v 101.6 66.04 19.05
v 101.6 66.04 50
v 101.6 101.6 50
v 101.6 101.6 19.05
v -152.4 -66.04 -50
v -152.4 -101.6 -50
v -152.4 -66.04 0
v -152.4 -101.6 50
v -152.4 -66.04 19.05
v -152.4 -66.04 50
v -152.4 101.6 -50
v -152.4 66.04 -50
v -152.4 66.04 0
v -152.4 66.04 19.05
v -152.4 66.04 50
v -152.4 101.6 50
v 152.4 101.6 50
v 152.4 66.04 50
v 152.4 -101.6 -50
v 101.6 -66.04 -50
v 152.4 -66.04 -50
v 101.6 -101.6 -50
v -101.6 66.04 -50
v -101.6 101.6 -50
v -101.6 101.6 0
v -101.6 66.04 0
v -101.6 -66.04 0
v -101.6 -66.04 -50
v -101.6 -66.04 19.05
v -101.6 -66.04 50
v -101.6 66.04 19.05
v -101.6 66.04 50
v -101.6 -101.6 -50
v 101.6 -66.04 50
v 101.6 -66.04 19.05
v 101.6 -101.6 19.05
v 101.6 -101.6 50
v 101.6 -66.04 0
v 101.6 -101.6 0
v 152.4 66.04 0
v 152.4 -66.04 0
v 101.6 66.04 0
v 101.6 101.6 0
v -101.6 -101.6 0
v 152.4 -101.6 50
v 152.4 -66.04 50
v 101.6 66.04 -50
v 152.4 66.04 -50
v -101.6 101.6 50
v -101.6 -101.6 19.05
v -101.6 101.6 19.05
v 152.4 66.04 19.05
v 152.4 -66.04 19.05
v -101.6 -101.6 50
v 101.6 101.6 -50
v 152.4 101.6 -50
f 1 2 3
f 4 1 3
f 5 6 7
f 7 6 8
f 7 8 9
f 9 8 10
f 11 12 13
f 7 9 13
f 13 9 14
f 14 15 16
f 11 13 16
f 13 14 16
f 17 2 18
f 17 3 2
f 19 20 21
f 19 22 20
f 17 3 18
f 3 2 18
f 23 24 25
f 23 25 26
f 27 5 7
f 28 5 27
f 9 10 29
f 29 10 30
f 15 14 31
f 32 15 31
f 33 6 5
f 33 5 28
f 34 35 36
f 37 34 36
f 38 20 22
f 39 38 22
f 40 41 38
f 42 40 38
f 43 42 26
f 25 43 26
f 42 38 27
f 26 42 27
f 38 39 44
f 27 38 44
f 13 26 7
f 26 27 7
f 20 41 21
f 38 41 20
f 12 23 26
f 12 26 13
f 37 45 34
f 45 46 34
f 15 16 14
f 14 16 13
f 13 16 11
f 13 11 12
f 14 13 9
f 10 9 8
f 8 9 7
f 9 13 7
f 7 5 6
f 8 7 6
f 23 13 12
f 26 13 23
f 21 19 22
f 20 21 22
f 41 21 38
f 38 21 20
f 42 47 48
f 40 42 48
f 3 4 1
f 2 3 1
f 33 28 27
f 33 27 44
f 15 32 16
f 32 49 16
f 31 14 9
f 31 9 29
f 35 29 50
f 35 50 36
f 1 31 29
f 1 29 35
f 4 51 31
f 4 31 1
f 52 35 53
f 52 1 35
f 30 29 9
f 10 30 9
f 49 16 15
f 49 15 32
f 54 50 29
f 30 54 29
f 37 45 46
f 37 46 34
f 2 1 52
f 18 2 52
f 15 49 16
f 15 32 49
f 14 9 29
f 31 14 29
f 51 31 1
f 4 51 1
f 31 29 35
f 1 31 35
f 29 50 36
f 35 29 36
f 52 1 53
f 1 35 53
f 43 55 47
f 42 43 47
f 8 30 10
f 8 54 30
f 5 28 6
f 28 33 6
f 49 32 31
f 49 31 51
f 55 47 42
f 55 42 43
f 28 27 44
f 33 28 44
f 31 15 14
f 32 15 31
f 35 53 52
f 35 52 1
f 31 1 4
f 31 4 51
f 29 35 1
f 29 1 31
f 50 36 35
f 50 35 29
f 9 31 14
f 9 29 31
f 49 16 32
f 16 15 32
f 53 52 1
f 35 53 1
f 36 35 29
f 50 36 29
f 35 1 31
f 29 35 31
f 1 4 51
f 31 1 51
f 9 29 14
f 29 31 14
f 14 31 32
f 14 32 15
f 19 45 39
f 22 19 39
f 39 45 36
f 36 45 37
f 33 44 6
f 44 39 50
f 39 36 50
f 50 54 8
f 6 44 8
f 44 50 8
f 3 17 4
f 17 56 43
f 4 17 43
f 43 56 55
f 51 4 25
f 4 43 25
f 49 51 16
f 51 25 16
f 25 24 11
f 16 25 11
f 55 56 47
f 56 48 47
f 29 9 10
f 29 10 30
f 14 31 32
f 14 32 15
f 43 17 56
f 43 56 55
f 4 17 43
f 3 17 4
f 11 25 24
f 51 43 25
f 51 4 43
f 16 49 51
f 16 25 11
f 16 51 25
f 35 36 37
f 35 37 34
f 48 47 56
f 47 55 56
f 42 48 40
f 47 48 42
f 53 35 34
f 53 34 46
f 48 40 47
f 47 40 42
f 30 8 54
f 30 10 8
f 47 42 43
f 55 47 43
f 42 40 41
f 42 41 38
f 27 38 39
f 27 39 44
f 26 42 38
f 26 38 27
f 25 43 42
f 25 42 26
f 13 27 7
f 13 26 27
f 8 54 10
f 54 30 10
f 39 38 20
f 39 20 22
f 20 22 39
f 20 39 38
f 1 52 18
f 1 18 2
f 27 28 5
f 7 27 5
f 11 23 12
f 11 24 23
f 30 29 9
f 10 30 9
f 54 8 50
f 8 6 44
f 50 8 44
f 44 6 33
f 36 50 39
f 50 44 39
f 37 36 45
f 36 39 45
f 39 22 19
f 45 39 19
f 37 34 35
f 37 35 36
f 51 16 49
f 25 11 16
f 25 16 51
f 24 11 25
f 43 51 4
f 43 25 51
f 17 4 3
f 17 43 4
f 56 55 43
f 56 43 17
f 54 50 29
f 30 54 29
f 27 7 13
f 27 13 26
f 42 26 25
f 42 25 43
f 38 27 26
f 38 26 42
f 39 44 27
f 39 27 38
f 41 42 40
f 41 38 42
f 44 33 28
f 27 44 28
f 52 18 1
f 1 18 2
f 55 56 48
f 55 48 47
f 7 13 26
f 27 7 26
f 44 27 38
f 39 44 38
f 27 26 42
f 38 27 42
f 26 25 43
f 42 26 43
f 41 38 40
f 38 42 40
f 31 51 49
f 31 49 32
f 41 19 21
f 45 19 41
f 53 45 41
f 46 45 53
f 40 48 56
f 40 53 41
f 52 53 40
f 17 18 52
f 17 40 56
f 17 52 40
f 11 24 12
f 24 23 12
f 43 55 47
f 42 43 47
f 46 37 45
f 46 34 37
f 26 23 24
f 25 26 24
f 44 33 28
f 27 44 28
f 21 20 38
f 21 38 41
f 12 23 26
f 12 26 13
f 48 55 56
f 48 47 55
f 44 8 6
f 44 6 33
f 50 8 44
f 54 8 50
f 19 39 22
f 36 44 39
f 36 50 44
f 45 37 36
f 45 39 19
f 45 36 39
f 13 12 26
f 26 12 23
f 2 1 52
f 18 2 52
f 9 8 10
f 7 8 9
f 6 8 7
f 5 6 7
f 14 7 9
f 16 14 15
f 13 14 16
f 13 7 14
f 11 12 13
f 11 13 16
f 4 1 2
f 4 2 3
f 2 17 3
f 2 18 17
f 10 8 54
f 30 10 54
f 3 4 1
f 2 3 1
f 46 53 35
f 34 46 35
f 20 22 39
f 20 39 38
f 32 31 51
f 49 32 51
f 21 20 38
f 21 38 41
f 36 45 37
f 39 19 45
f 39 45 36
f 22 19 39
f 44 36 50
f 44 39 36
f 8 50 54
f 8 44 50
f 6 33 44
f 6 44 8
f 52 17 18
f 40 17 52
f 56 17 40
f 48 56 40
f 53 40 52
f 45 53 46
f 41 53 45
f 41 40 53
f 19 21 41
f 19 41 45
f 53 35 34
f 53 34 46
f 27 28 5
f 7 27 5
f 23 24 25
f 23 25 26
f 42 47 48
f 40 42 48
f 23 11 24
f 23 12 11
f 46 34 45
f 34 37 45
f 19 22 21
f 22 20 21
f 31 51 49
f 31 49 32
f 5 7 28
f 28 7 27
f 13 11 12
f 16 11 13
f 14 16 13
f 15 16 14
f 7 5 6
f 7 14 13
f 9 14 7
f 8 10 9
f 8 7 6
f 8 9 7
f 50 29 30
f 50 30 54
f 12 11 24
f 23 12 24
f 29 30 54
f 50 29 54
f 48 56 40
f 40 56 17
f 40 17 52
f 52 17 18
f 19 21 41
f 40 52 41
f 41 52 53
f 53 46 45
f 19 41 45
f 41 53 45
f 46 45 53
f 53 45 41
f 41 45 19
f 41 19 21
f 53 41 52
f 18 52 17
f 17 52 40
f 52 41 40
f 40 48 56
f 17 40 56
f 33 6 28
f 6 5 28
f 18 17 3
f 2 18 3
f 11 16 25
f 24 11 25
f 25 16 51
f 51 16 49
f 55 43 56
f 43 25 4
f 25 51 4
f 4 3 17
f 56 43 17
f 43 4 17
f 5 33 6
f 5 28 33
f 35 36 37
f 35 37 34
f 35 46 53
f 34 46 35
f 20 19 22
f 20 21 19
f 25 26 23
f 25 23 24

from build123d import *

# Parameters (mm, degrees)
F0_W      = 304.8
F0_H      = 20.32
F1_DEPTH  = 19.05
F2_DEPTH  = 50
F10_DEPTH = 79.4


# Not quite as in the source:
# - a feature names something its author has since deleted; it is built from what else it names


with BuildPart() as f1:
    # F0 (on Top) → F1 (new body)
    with BuildSketch(Plane.XY):
        Rectangle(F0_W, F0_H)
        Polygon((-152.4, 10.16), (152.4, 10.16), (152.4, 66.04), (101.6, 66.04), (101.6, 83.82), (-101.6, 85.344), (-101.6, 66.04), (-152.4, 66.04), align=None)
        Polygon((-101.6, -101.6), (101.6, -101.6), (101.6, -83.82), (-101.6, -85.344), align=None)
        Polygon((101.6, 83.82), (101.6, 101.6), (-101.6, 101.6), (-101.6, 85.344), align=None)
        Polygon((101.6, -66.04), (152.4, -66.04), (152.4, -10.16), (-152.4, -10.16), (-152.4, -66.04), (-101.6, -66.04), (-101.6, -85.344), (101.6, -83.82), align=None)
        Polygon((-152.4, 101.6), (-152.4, 66.04), (-101.6, 66.04), (-101.6, 85.344), (-101.6, 101.6), align=None)
        Polygon((-152.4, -101.6), (-101.6, -101.6), (-101.6, -85.344), (-101.6, -66.04), (-152.4, -66.04), align=None)
        Polygon((101.6, -101.6), (152.4, -101.6), (152.4, -66.04), (101.6, -66.04), (101.6, -83.82), align=None)
        Polygon((101.6, 66.04), (152.4, 66.04), (152.4, 101.6), (101.6, 101.6), (101.6, 83.82), align=None)
    extrude(amount=F1_DEPTH)

    # F0 (on Top) → F2 (join, symmetric)
    with BuildSketch(Plane.XY):
        Polygon((-152.4, -101.6), (-101.6, -101.6), (-101.6, -85.344), (-101.6, -66.04), (-152.4, -66.04), align=None)
        Polygon((-152.4, 101.6), (-152.4, 66.04), (-101.6, 66.04), (-101.6, 85.344), (-101.6, 101.6), align=None)
        Polygon((101.6, 66.04), (152.4, 66.04), (152.4, 101.6), (101.6, 101.6), (101.6, 83.82), align=None)
        Polygon((101.6, -101.6), (152.4, -101.6), (152.4, -66.04), (101.6, -66.04), (101.6, -83.82), align=None)
    extrude(amount=F2_DEPTH, both=True)


with BuildPart() as f7_1:
    # F7: instance of F1
    add(f1.part.mirror(Plane.XZ))


with BuildPart() as f8_1:
    # F8: instance of F7_1
    add(f7_1.part.mirror(Plane.YZ))


with BuildPart() as f8_2:
    # F8: instance of F1
    add(f1.part.mirror(Plane.YZ))


with BuildPart() as f1_1:
    add(f1.part)

    # F9 (on face) → F10 (cut)
    with BuildSketch(Plane.XZ.offset(101.6)):
        with BuildLine():
            ThreePointArc((-28.6936778575, 19.2373767495), (-46.8099126592, 32.3162109562), (-64.9261474609, 19.2373767495))
            Line((-64.9261474609, 19.2373767495), (-28.6936778575, 19.2373767495))
        make_face()
        with BuildLine():
            ThreePointArc((71.8333274126, 19.2373767495), (61.1908975989, 30.3037829778), (50.5484677851, 19.2373767495))
            Line((50.5484677851, 19.2373767495), (71.8333274126, 19.2373767495))
        make_face()
        with BuildLine():
            ThreePointArc((48.6789308488, 19.2373767495), (31.709279865, 31.1125167708), (14.7396288812, 19.2373767495))
            Line((14.7396288812, 19.2373767495), (48.6789308488, 19.2373767495))
        make_face()
        with BuildLine():
            ThreePointArc((11.0462261364, 19.2373767495), (-7.4003641494, 32.1407625343), (-25.8469544351, 19.2373767495))
            Line((-25.8469544351, 19.2373767495), (11.0462261364, 19.2373767495))
        make_face()
    extrude(amount=-F10_DEPTH, mode=Mode.SUBTRACT)


solid = Compound([f7_1.part, f8_1.part, f8_2.part, f1_1.part])
